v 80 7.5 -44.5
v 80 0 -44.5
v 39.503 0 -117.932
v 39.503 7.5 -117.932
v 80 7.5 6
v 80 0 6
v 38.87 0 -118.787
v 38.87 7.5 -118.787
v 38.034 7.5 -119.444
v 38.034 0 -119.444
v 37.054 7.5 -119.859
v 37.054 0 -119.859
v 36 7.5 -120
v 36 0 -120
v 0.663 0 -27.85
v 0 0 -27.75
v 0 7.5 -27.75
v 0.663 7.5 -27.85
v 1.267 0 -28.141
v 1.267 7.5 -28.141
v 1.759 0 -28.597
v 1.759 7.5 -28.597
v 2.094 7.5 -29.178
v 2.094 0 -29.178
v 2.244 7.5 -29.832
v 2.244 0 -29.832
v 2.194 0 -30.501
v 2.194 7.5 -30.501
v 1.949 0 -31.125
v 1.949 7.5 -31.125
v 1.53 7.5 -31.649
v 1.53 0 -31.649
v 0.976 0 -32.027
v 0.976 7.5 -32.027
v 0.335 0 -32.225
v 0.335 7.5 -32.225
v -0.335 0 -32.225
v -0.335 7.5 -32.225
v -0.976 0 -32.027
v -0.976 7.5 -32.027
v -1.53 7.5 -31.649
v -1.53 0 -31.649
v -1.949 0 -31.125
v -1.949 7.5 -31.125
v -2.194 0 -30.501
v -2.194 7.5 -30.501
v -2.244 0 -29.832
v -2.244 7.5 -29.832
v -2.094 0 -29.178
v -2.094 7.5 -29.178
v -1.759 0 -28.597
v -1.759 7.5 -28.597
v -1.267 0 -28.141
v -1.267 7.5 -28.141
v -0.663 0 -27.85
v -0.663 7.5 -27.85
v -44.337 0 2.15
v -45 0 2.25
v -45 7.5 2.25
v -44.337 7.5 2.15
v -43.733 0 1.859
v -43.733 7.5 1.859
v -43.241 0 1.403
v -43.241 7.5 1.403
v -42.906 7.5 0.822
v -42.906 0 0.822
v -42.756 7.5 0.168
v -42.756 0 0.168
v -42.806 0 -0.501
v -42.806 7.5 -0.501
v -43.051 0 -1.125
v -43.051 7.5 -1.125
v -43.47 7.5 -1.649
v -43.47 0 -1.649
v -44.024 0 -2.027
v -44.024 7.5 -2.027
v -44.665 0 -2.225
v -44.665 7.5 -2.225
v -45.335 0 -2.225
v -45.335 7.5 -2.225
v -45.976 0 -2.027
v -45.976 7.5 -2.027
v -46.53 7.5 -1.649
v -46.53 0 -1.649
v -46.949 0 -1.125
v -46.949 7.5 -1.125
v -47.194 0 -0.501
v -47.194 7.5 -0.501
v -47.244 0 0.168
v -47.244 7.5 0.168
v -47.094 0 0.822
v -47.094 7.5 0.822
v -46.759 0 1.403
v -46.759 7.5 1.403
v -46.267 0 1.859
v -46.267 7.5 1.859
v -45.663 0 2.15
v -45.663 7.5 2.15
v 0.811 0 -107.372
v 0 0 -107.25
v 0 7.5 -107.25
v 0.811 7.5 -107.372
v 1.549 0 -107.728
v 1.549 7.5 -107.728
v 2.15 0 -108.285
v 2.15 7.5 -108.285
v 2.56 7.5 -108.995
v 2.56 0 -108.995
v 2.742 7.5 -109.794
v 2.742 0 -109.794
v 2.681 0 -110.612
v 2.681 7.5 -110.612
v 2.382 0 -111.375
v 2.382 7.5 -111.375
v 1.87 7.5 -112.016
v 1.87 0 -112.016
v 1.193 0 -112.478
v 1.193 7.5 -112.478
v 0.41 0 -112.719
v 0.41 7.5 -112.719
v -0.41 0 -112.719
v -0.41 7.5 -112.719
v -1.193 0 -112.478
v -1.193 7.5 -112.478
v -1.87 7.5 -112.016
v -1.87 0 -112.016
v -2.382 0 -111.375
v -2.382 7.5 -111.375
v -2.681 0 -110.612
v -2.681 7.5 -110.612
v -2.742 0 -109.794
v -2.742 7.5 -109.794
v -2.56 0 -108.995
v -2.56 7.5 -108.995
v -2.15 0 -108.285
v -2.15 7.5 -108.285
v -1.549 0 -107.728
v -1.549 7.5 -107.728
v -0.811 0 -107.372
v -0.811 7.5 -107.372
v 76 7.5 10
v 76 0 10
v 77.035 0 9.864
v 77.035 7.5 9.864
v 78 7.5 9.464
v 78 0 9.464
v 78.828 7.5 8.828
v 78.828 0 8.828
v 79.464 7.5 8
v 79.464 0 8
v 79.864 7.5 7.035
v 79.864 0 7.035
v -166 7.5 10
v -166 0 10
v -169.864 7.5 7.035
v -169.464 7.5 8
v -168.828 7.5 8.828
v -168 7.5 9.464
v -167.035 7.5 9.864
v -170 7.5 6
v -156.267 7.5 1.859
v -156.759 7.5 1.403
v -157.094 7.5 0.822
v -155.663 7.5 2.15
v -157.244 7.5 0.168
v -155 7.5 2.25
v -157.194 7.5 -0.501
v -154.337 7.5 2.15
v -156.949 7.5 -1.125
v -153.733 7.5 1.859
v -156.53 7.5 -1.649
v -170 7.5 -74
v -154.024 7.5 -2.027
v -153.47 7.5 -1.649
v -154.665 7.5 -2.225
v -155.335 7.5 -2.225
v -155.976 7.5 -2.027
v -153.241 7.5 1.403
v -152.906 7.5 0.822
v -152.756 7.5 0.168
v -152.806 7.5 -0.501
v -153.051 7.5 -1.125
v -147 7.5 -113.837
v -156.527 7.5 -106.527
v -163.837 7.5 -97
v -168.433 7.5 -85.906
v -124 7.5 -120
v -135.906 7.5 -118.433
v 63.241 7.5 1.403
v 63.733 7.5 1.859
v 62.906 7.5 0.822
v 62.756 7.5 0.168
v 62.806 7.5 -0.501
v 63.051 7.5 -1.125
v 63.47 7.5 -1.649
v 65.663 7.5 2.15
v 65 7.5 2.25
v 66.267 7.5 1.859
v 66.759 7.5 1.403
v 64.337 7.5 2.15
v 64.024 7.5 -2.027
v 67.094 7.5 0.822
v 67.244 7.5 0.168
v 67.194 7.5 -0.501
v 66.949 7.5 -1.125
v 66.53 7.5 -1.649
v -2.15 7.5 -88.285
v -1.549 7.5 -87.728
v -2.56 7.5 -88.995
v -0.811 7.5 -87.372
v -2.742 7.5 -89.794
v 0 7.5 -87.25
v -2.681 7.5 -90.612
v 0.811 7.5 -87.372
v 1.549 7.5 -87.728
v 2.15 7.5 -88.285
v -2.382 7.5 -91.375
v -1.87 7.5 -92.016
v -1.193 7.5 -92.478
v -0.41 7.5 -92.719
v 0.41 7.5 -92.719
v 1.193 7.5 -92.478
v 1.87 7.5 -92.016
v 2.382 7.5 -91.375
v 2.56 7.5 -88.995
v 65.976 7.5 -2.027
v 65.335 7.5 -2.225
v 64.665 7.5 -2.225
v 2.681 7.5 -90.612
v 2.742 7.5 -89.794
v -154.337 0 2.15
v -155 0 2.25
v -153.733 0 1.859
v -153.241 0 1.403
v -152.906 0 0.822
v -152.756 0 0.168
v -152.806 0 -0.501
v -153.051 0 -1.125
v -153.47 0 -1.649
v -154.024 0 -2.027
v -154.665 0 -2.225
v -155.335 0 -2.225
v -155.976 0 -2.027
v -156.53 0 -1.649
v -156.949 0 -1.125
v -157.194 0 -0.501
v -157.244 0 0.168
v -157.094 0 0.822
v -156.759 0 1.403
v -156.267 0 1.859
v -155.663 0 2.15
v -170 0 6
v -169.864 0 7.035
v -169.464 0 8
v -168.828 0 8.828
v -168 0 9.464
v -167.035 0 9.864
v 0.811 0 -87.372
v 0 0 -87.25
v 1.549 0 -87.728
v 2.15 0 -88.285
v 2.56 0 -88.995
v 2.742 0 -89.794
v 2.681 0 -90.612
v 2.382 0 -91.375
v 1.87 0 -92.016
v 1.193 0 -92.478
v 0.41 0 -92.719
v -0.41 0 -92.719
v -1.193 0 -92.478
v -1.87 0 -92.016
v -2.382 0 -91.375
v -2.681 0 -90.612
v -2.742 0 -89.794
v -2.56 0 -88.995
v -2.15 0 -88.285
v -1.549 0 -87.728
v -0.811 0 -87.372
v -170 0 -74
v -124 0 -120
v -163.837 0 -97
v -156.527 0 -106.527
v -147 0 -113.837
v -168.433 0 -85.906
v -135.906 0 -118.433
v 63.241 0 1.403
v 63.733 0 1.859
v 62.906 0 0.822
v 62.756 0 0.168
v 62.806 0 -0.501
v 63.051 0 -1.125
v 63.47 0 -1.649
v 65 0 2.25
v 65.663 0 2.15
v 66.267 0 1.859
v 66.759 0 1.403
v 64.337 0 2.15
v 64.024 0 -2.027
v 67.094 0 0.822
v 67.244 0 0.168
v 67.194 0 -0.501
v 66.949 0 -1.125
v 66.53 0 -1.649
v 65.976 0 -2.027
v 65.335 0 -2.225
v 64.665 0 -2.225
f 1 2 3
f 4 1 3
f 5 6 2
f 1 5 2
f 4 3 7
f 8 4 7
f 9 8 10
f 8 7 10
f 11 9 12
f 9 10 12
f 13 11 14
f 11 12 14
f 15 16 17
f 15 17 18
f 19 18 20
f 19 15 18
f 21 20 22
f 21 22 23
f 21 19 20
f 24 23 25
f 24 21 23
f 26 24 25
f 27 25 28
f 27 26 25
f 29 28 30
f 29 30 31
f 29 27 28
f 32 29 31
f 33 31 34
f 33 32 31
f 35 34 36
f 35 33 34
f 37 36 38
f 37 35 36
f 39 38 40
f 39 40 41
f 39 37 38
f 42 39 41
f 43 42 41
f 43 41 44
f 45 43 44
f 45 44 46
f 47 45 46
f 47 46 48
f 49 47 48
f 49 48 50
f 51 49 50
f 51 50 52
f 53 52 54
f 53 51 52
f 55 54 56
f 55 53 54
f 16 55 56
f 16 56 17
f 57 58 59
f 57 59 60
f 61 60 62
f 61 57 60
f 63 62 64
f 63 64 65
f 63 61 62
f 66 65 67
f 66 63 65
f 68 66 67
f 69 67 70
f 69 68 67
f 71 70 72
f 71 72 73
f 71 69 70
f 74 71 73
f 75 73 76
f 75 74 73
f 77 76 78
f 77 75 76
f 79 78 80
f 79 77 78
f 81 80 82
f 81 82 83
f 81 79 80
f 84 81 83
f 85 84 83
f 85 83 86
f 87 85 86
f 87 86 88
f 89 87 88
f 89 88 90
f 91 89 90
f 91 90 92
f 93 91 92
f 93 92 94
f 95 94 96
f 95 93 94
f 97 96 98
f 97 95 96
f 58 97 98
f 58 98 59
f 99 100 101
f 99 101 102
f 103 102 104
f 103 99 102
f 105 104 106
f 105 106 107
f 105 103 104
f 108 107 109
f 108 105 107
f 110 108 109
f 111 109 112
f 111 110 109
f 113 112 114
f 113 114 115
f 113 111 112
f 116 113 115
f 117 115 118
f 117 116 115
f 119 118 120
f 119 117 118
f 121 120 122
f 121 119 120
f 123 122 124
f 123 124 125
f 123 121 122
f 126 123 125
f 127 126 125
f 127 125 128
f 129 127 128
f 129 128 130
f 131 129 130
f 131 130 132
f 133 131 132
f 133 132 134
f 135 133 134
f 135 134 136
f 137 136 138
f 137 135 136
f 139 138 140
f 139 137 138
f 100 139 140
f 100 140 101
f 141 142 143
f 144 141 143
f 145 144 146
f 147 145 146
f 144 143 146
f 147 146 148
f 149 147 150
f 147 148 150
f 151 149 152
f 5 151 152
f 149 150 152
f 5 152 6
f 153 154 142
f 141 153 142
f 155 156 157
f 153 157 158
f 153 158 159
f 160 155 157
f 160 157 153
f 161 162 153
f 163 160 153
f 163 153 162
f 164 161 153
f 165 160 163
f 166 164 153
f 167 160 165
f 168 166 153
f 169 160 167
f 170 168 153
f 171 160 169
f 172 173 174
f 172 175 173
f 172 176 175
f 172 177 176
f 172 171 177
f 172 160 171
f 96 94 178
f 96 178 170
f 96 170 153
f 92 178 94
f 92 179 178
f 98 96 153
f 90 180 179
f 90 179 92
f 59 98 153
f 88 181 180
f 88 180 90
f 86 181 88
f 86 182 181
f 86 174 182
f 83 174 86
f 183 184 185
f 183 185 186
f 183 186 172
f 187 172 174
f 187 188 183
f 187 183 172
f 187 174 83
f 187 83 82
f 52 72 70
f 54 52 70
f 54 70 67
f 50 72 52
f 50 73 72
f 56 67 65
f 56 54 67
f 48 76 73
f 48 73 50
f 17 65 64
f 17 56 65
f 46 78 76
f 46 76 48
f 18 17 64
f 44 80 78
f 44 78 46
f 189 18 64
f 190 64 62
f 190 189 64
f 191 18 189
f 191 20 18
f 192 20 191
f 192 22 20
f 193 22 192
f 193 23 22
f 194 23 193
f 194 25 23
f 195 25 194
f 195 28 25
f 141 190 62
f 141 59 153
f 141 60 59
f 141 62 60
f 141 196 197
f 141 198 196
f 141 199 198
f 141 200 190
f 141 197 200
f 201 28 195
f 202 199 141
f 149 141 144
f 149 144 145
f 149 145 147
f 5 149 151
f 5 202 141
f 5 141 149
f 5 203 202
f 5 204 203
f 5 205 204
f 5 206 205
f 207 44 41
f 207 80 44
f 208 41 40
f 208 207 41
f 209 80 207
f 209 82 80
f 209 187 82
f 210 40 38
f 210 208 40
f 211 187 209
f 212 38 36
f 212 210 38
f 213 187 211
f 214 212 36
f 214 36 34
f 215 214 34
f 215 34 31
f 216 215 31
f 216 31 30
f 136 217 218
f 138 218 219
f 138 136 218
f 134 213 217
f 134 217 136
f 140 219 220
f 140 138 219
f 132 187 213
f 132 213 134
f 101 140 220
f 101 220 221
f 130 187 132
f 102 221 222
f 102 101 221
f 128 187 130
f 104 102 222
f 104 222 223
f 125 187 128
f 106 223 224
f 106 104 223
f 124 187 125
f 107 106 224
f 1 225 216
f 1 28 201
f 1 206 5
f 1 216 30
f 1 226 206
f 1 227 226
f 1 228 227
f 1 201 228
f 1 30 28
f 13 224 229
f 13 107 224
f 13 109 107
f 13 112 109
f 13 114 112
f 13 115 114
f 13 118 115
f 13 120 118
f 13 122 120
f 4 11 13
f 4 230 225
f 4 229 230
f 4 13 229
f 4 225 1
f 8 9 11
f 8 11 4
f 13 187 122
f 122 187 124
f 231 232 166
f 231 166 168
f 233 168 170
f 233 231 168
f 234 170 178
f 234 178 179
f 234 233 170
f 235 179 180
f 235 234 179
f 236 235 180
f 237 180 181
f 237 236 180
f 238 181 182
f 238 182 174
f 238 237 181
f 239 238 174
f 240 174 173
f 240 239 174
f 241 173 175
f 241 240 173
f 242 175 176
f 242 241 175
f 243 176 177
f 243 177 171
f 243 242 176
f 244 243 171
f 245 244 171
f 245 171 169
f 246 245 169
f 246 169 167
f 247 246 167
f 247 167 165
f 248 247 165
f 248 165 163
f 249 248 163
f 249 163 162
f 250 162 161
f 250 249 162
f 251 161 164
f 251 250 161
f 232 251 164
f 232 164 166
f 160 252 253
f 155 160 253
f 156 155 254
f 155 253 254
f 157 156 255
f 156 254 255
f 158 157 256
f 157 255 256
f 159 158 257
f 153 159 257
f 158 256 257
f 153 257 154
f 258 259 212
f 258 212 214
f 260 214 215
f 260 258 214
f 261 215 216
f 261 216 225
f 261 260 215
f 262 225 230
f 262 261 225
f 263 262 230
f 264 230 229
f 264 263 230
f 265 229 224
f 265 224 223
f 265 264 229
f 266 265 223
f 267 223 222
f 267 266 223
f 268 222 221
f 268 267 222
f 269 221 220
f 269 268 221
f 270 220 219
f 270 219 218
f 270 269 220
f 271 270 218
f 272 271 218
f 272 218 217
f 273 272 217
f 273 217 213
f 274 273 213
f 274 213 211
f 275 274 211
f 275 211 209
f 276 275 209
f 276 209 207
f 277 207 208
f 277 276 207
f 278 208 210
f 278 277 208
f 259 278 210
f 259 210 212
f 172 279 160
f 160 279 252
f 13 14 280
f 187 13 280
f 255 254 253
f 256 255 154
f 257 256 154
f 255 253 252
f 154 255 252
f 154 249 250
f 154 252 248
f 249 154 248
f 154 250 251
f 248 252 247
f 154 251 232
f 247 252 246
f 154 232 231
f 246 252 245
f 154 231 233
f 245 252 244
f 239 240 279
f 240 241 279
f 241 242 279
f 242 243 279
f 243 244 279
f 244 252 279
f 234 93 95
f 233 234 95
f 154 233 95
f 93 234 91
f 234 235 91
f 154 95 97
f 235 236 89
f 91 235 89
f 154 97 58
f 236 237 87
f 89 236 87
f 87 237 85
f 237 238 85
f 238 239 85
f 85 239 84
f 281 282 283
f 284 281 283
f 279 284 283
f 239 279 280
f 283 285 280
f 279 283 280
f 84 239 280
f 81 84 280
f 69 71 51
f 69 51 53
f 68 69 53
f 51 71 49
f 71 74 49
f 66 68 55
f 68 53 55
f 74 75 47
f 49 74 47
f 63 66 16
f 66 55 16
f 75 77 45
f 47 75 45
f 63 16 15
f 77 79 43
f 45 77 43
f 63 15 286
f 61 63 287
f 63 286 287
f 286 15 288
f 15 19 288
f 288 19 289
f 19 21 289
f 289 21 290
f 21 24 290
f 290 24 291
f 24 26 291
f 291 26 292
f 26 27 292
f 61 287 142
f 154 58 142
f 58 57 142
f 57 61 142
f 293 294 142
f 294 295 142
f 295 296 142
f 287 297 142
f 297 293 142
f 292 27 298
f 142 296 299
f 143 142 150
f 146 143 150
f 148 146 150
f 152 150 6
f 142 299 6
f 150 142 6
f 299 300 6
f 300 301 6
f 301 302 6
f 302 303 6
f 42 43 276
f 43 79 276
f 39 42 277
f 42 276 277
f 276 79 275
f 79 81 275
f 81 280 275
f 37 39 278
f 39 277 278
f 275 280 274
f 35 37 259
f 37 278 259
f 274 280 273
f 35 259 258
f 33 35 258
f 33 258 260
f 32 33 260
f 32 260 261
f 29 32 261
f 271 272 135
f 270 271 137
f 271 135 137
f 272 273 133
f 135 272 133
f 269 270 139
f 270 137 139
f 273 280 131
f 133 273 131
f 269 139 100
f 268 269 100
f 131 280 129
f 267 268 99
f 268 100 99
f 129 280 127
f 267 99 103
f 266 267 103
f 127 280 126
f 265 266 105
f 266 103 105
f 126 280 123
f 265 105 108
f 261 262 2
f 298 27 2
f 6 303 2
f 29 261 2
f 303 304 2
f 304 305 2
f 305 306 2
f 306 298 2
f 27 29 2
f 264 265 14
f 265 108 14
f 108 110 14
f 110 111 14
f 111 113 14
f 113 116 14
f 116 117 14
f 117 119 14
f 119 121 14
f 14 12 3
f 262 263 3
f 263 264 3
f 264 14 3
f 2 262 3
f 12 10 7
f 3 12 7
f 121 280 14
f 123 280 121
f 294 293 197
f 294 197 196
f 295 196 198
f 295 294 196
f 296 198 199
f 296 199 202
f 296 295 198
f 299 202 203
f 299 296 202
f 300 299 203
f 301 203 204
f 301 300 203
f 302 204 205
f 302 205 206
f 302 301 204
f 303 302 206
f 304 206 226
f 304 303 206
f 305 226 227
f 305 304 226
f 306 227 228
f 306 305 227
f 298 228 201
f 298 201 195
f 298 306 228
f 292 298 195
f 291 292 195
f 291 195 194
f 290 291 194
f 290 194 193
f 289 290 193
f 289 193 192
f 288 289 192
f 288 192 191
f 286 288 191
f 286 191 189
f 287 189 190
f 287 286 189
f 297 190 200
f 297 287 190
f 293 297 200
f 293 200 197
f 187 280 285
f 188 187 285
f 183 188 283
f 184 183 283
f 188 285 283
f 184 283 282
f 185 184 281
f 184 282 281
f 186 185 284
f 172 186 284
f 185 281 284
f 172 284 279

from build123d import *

# Parameters (mm, degrees)
SKETCH1_R           = 2.25
SKETCH1_R_2         = 2.75
BOSS_EXTRUDE1_DEPTH = 7.5


with BuildPart() as part:
    # Sketch1 → Boss-Extrude1 (new body)
    with BuildSketch(Plane(origin=(0, 0, 0), x_dir=(1, 0, 0), z_dir=(0, 1, 0))):
        with BuildLine():
            Line((-166, -10), (76, -10))
            ThreePointArc((76, -10), (78.828427125, -8.828427125), (80, -6))
            Line((80, -6), (80, 44.5))
            Line((80, 44.5), (39.502647377, 117.931699085))
            ThreePointArc((39.502647377, 117.931699085), (38.033863769, 119.444328406), (36, 120))
            Line((36, 120), (-124, 120))
            ThreePointArc((-124, 120), (-156.526911935, 106.526911935), (-170, 74))
            Line((-170, 74), (-170, -6))
            ThreePointArc((-170, -6), (-168.828427125, -8.828427125), (-166, -10))
        make_face()
        with Locations(Location((65, 0, 0), (0, 0, 270))):
            Circle(SKETCH1_R, mode=Mode.SUBTRACT)
        with Locations(Location((-45, 0, 0), (0, 0, 270))):
            Circle(SKETCH1_R, mode=Mode.SUBTRACT)
        with Locations(Location((-155, 0, 0), (0, 0, 270))):
            Circle(SKETCH1_R, mode=Mode.SUBTRACT)
        with Locations(Location((0, 90, 0), (0, 0, 270))):
            Circle(SKETCH1_R_2, mode=Mode.SUBTRACT)
        with Locations(Location((0, 110, 0), (0, 0, 270))):
            Circle(SKETCH1_R_2, mode=Mode.SUBTRACT)
        with Locations(Location((0, 30, 0), (0, 0, 270))):
            Circle(SKETCH1_R, mode=Mode.SUBTRACT)
    extrude(amount=BOSS_EXTRUDE1_DEPTH)


solid = part.part
